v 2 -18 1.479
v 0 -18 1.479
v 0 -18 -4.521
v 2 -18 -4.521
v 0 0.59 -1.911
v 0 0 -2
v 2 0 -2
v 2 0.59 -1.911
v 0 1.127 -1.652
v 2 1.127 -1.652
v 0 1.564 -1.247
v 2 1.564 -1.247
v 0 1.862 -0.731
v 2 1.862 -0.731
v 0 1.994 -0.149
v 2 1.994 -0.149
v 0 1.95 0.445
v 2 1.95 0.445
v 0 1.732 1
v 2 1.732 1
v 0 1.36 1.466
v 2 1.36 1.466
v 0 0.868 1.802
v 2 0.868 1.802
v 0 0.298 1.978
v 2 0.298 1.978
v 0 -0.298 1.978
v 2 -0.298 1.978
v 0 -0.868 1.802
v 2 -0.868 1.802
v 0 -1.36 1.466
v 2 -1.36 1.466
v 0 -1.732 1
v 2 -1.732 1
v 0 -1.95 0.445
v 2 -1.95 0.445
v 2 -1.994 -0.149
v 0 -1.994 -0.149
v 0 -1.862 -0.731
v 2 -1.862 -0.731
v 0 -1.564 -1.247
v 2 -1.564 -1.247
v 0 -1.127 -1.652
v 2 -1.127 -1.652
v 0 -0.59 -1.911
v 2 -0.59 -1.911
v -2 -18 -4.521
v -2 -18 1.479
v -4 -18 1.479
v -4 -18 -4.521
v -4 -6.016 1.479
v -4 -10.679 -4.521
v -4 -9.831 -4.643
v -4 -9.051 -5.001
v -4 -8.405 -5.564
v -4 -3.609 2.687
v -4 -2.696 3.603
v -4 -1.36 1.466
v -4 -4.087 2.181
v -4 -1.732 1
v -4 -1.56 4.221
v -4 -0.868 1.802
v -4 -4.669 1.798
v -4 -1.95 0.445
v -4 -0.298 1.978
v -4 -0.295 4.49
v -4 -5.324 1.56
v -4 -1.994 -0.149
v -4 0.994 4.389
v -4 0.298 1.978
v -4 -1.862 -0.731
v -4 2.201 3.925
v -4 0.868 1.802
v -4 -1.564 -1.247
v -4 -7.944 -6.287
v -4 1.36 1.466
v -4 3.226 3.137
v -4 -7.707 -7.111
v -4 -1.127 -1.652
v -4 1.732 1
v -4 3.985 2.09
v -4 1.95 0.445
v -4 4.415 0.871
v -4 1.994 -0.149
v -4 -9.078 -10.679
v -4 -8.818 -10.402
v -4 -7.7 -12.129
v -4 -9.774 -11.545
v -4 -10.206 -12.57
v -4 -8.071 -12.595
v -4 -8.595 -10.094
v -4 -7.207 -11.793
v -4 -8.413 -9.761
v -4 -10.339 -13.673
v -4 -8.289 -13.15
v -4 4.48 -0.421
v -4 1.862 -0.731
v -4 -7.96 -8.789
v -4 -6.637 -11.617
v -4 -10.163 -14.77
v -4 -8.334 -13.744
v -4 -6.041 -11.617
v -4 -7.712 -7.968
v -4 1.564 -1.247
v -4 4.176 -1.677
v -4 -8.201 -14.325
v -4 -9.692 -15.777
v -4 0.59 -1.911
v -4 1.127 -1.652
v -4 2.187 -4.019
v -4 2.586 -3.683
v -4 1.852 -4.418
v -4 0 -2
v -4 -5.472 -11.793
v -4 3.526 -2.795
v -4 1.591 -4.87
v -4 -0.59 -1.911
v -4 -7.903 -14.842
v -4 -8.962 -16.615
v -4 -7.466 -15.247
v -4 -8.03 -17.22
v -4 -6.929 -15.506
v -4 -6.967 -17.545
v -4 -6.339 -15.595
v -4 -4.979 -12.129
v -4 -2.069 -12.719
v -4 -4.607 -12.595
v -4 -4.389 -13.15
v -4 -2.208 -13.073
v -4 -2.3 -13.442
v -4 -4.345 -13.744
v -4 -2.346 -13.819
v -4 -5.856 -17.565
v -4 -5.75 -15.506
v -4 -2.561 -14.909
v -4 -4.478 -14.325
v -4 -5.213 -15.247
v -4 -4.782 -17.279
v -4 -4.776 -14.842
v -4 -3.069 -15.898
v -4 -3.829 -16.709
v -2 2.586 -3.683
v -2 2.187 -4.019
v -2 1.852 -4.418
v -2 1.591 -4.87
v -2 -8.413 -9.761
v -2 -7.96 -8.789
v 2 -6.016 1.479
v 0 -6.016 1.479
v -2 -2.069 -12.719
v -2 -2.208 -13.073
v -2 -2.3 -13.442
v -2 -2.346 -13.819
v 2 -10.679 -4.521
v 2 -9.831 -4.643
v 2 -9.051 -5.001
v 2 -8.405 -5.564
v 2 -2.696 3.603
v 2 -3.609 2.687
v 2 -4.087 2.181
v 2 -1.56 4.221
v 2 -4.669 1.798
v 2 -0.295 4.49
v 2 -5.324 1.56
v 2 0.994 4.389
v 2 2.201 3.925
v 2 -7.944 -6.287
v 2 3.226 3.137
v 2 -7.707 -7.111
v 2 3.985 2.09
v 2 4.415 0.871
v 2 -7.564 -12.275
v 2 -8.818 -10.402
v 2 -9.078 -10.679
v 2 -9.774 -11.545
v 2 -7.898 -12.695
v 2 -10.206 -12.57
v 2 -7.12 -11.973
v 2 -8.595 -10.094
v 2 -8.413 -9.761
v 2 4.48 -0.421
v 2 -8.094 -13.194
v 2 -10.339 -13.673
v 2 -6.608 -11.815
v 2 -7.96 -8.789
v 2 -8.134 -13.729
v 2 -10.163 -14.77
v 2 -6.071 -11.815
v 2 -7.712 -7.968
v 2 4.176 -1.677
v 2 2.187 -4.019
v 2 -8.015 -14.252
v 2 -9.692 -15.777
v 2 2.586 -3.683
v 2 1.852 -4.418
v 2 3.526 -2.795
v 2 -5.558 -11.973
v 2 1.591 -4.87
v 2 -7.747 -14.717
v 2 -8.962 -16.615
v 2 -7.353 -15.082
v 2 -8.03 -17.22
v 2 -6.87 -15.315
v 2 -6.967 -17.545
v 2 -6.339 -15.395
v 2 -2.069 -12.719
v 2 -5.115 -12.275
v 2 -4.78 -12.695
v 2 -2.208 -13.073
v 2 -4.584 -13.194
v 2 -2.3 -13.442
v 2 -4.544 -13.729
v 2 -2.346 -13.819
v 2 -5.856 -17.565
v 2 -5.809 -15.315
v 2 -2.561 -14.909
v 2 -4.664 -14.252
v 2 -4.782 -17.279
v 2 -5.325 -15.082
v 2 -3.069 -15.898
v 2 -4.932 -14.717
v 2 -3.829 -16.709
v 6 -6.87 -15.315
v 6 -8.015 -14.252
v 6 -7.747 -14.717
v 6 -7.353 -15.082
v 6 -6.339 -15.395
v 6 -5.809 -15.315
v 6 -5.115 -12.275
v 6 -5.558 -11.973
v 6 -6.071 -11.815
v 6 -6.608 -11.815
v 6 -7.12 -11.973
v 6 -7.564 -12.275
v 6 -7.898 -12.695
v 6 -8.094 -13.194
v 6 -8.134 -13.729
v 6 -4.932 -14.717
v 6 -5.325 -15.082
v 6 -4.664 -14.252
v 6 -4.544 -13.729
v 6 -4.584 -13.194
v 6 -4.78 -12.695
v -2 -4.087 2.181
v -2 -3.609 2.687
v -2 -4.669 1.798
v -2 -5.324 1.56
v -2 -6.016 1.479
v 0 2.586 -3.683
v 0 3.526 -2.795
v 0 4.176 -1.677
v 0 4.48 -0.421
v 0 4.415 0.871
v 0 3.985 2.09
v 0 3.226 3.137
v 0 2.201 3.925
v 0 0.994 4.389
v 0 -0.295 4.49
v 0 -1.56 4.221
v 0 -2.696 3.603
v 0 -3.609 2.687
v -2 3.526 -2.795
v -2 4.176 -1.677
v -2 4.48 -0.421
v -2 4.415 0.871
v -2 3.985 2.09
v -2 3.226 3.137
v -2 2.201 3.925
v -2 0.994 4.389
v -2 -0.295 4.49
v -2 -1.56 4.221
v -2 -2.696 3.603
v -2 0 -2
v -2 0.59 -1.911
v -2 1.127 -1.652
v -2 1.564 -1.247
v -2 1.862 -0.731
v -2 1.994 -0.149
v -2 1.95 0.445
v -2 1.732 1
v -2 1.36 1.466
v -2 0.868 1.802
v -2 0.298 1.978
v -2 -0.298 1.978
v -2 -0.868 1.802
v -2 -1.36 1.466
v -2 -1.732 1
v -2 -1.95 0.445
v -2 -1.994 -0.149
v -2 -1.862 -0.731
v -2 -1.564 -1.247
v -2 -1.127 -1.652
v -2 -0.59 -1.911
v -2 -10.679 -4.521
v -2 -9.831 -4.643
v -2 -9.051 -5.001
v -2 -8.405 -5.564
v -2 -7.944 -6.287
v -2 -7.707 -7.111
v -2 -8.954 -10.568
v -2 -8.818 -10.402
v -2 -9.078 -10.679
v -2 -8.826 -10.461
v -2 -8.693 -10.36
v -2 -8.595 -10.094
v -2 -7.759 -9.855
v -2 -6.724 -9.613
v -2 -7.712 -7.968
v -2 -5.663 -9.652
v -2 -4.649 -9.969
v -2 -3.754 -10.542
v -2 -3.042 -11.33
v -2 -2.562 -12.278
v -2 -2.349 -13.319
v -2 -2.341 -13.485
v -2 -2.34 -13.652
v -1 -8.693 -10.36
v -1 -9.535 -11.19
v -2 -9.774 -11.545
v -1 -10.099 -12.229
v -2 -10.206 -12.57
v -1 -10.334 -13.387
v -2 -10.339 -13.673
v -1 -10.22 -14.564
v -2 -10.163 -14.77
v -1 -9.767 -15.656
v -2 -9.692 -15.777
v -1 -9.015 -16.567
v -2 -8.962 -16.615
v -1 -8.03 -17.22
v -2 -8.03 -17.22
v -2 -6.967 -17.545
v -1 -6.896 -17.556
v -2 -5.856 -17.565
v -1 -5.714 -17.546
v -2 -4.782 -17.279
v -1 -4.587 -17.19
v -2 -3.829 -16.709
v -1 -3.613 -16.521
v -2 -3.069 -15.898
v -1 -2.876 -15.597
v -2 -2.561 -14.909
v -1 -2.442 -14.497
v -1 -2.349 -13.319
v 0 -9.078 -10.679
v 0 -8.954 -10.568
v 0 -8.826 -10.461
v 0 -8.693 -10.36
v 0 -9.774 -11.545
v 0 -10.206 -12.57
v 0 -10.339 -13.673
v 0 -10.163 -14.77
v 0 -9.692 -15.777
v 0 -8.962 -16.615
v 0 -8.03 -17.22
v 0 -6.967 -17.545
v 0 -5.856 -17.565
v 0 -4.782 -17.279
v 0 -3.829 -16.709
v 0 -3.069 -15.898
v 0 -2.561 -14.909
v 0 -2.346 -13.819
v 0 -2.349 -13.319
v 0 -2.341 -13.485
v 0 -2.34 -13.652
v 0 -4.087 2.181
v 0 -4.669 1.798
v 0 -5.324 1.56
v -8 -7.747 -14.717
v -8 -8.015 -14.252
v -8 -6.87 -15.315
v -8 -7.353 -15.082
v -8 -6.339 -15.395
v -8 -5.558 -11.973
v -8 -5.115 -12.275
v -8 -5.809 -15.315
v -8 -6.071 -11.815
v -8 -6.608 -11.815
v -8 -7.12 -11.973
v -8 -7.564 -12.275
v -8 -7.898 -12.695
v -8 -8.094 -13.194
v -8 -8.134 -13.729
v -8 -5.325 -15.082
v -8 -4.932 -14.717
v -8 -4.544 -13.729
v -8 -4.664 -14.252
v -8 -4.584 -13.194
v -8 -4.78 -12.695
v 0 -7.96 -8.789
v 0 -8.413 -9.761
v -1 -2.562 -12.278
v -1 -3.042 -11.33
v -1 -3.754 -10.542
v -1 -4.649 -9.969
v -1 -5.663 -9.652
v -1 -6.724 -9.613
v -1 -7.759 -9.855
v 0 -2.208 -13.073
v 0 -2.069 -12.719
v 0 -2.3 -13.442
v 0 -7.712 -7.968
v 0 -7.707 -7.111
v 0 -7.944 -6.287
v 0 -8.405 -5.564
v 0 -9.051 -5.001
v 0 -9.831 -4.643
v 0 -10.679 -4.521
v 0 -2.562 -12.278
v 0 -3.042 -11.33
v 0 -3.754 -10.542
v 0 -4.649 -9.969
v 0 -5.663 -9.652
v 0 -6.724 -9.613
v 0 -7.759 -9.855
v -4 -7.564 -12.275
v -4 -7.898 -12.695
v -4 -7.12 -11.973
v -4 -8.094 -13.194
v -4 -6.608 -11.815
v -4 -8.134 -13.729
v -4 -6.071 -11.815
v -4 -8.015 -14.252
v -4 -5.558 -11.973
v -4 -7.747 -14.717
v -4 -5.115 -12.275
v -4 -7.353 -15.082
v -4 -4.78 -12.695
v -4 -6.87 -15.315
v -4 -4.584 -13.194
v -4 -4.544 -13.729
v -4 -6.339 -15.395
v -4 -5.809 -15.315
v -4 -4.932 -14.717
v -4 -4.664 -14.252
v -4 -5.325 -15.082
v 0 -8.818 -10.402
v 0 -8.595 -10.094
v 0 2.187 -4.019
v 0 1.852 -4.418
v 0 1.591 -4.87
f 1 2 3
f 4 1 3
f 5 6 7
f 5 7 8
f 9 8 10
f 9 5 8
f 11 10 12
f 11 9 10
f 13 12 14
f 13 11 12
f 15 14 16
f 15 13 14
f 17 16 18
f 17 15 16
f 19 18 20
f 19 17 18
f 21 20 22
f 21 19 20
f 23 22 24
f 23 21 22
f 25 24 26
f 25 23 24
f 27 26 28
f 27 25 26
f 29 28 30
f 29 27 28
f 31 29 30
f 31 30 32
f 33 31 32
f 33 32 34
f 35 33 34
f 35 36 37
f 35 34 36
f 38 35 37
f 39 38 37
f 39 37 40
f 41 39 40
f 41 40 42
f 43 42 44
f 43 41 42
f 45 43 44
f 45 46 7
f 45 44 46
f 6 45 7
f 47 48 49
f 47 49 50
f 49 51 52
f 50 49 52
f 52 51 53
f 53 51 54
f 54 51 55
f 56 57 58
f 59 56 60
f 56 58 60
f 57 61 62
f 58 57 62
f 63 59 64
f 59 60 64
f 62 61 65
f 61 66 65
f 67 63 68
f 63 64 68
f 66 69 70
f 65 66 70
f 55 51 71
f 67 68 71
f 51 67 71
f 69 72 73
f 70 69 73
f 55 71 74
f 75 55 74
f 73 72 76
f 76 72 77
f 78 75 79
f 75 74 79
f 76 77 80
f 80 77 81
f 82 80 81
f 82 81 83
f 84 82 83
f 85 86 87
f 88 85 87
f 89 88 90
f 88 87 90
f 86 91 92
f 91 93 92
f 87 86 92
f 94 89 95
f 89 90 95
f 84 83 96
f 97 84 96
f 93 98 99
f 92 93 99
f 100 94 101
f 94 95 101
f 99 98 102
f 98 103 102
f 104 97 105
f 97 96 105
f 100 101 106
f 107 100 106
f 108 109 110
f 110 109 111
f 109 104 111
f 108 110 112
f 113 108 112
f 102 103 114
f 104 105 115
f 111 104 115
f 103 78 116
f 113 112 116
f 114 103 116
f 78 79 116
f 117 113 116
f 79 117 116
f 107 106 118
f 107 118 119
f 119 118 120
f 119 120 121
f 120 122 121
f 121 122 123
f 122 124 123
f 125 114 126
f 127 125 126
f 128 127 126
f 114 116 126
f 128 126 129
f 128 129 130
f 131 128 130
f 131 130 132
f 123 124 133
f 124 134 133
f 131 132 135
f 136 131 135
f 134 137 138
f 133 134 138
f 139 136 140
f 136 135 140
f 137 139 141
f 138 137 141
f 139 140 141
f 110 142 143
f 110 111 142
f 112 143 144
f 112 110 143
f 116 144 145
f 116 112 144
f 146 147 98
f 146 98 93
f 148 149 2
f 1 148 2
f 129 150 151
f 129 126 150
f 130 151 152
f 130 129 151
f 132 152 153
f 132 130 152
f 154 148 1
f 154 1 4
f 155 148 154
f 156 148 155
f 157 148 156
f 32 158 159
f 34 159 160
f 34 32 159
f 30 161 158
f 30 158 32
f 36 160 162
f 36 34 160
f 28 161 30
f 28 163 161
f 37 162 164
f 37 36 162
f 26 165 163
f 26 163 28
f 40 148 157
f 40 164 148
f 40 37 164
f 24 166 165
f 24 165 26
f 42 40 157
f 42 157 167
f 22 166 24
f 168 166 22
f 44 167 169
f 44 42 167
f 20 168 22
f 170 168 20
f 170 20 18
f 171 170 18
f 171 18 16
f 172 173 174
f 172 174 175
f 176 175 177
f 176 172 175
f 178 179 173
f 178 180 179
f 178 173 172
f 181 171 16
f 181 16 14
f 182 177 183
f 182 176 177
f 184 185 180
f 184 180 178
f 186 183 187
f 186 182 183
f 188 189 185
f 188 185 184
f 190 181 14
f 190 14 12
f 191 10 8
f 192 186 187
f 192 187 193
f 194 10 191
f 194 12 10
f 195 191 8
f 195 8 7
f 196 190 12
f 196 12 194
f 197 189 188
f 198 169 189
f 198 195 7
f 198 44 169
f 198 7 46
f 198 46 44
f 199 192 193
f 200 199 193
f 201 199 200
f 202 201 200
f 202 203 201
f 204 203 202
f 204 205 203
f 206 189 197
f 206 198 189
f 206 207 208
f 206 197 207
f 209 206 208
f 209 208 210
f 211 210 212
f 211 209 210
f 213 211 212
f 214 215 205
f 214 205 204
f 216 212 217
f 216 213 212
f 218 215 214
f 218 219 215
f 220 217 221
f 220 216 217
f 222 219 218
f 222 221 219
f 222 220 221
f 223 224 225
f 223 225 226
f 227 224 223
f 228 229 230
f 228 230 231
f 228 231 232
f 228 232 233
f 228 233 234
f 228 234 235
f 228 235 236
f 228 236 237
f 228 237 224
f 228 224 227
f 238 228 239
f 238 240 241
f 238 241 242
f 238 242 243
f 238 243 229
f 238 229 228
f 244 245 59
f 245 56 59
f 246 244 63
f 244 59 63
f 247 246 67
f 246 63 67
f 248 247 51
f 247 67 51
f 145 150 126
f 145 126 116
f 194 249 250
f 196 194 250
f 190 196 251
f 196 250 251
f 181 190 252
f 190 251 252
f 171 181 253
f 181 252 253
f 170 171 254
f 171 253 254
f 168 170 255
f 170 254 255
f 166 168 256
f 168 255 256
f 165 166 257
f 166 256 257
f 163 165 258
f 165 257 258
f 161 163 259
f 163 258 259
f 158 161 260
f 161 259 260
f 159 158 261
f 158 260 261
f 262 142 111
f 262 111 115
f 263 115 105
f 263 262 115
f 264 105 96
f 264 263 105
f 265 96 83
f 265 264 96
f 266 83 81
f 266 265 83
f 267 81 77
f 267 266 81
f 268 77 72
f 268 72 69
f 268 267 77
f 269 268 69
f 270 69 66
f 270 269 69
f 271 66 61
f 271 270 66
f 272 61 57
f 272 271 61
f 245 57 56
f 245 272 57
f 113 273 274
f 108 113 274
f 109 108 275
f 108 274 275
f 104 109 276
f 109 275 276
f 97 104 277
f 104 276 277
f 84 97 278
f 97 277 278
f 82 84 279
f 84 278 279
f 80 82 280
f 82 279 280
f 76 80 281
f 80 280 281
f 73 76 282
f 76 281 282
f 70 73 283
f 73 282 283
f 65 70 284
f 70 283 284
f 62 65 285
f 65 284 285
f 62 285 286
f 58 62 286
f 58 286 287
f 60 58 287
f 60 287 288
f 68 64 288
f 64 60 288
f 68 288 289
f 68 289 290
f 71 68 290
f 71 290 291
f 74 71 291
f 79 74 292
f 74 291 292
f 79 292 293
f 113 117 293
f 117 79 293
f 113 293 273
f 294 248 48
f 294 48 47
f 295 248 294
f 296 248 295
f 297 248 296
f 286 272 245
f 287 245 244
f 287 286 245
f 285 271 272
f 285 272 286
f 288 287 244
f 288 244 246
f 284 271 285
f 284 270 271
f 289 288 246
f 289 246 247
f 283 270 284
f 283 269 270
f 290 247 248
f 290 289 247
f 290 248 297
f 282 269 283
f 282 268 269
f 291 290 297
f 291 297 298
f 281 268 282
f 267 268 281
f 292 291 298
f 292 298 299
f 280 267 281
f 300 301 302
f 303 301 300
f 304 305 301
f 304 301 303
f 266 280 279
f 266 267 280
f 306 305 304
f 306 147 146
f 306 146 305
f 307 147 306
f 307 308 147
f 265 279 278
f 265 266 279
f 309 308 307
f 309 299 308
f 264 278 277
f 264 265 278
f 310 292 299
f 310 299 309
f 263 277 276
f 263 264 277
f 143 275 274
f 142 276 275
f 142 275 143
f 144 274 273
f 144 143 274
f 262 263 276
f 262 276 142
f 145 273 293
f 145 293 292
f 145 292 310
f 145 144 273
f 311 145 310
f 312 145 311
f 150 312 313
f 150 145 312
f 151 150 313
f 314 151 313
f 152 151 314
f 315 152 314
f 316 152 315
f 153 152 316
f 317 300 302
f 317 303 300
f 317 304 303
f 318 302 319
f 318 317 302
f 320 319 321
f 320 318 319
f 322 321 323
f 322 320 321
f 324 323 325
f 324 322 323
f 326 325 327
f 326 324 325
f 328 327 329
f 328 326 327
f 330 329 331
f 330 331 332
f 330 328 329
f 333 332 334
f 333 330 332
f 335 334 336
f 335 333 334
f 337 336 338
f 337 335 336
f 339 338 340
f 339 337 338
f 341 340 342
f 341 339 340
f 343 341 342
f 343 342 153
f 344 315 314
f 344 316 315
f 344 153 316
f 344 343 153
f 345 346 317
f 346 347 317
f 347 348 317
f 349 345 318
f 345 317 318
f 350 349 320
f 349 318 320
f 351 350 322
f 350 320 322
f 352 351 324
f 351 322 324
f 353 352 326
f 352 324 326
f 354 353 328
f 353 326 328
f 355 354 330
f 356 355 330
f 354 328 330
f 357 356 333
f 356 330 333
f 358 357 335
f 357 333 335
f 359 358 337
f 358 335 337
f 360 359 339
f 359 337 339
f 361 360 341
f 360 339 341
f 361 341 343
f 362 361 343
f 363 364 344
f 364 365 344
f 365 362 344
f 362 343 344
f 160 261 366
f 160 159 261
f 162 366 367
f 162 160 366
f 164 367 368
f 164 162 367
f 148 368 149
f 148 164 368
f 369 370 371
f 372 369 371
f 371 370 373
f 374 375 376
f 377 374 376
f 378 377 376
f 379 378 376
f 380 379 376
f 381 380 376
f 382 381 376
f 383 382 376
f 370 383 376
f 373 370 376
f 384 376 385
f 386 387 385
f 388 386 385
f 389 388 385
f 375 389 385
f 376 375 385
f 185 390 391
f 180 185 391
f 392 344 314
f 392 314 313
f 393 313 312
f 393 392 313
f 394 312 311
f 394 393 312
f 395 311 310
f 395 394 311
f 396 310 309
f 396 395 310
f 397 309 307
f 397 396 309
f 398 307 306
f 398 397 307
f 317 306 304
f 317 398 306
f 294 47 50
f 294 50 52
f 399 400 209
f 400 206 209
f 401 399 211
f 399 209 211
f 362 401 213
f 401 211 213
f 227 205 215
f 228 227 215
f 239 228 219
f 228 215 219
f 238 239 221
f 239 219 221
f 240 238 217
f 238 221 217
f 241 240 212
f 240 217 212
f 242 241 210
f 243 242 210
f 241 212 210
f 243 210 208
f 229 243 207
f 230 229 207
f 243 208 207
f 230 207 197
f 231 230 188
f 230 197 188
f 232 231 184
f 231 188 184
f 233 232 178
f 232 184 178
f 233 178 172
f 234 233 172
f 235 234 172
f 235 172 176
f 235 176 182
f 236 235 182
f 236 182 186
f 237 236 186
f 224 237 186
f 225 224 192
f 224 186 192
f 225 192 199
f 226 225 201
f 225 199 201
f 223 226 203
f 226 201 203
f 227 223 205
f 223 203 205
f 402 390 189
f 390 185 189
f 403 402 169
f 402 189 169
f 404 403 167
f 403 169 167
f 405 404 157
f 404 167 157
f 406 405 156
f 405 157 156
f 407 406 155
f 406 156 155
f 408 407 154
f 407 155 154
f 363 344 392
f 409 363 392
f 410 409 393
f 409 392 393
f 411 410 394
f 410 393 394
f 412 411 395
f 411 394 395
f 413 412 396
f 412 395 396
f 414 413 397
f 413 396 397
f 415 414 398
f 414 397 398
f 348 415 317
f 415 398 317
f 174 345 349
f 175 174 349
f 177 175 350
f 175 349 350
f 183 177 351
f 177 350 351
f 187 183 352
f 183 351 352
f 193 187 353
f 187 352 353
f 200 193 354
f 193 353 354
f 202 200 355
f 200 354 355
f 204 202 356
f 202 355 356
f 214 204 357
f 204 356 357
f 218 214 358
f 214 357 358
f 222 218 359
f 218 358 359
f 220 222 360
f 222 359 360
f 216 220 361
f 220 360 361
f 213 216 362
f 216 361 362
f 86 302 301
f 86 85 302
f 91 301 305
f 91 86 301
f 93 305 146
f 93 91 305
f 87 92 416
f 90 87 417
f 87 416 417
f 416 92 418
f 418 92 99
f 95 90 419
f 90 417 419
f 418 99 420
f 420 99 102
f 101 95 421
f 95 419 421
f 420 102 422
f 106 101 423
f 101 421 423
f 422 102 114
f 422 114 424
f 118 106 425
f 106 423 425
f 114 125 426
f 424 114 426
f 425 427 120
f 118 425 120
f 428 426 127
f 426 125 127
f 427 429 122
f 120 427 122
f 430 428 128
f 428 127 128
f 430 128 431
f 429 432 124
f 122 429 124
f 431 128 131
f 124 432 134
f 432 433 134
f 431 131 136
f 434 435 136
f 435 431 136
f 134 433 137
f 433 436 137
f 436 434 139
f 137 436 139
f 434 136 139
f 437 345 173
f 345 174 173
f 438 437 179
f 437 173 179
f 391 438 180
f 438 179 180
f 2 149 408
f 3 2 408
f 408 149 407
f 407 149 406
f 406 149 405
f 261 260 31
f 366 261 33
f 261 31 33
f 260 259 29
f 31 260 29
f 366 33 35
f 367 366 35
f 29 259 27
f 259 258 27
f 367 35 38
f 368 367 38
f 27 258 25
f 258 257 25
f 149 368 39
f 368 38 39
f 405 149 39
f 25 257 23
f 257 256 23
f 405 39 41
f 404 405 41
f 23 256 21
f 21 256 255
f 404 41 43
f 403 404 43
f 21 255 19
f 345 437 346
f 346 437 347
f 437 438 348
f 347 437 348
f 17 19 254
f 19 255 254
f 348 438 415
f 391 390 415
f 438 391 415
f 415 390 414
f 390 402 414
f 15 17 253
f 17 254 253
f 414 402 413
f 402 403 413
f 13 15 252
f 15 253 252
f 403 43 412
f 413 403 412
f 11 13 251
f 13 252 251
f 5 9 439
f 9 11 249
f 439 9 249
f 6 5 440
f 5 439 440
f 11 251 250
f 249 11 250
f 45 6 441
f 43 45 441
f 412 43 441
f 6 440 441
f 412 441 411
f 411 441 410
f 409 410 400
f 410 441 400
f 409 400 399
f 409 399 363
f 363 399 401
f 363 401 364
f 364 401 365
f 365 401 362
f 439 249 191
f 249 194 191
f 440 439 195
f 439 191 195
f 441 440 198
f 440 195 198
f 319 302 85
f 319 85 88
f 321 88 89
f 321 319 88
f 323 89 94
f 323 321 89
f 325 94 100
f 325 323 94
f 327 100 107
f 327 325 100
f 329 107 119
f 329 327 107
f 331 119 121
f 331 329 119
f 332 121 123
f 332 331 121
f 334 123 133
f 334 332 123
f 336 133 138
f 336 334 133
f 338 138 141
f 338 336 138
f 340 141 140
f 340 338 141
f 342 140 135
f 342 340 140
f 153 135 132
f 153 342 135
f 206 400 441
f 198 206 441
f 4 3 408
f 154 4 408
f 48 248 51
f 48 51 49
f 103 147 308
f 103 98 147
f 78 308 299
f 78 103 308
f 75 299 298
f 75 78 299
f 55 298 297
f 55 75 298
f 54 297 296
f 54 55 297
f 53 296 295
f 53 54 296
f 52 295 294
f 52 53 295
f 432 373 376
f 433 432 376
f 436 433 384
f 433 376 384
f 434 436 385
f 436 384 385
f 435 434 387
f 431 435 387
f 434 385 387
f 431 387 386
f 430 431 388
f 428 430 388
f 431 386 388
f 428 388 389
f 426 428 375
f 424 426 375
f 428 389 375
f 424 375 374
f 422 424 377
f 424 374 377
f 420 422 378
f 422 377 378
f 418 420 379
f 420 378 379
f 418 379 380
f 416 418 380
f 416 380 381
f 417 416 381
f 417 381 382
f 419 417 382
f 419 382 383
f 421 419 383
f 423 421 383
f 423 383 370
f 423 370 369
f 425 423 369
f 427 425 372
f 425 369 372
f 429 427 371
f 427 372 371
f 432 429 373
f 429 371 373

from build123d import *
from build123d.topology import SkipClean

# Parameters (mm, degrees)
EXTRUDE_1_DEPTH          = 2
CUT_EXTRUDE_3_DEPTH      = 26.250159217995726
CUT_EXTRUDE_3_DEPTH_BACK = 26.250159217995726
SKETCH_1_3_R             = 2
SKETCH_1_3_R_2           = 1.9999999999999996
FILLET_1_R               = 3
EXTRUDE_START            = -1
EXTRUDE_2_DEPTH          = 1
SKETCH_2_R               = 1.9999999999999996
EXTRUDE_3_DEPTH          = 6
SKETCH_2_3_R             = 1.7999999999999992
EXTRUDE_4_DEPTH          = 4
EXTRUDE_START_2          = -10
SKETCH_2_4_R             = 1.7999999999999992
EXTRUDE_5_DEPTH          = 4


with BuildPart() as part:
    # 草图1 → 凸台-拉伸1 (new body)
    with BuildSketch(Plane(origin=(0, 0, 0), x_dir=(0, 0, -1), z_dir=(1, 0, 0))):
        with BuildLine():
            Line((1.4791639160924377, 3.172077254628277), (-1.4791639160924381, -3.172077254628276))
            Line((-1.4791639160924381, -3.172077254628276), (3.1918530496674338, -3.172077254628276))
            ThreePointArc((3.1918530496673796, -3.172077254628116), (4.160128527071201, -1.7156137788699422), (4.5, -1.1e-15))
            ThreePointArc((4.5, 0), (4.384156275694355, 1.0144820108261179), (4.042589444315643, 1.9767322997077126))
            Line((4.042589444315688, 1.9767322997077619), (1.4791639160924377, 3.172077254628277))
        make_face()
        with BuildLine():
            Line((1.0842616121308644, -4.367422209548816), (-1.4791639160924381, -3.172077254628276))
            Line((-1.4791639160924381, -3.172077254628276), (-1.479163916092438, -4.249949894919907))
            ThreePointArc((-1.4791639160925047, -4.249949894919926), (-0.20600216890754225, -4.495282316652135), (1.0842616121308772, -4.367422209548712))
        make_face()
        with BuildLine():
            Line((3.1918530496674338, -3.172077254628276), (-1.4791639160924381, -3.172077254628276))
            Line((-1.4791639160924381, -3.172077254628276), (1.0842616121308644, -4.367422209548816))
            ThreePointArc((1.0842616121308772, -4.367422209548712), (2.220022869369828, -3.914268572731687), (3.1918530496673796, -3.172077254628116))
        make_face()
        with BuildLine():
            Line((-1.479163916092438, -4.249949894919907), (-1.4791639160924381, -3.172077254628276))
            Line((-1.4791639160924381, -3.172077254628276), (1.4791639160924377, 3.172077254628277))
            Line((1.4791639160924377, 3.172077254628277), (4.042589444315688, 1.9767322997077619))
            ThreePointArc((4.042589444315643, 1.9767322997077126), (-3.3668502191083185, 2.9856857842194757), (-1.4791639160925047, -4.249949894919926))
        make_face()
        with BuildLine():
            ThreePointArc((4.5, -1.1e-15), (4.160128527071201, -1.7156137788699422), (3.1918530496673796, -3.172077254628116))
            Line((3.1918530496674338, -3.172077254628276), (4.520836083907562, -3.172077254628276))
            Line((4.520836083907562, -3.172077254628276), (4.520836083907562, -5.969923203558247))
            Line((4.520836083907563, -5.969923203558248), (10.360395406591675, -8.692954435976247))
            ThreePointArc((10.360395406591717, -8.69295443597619), (9.969385657403148, -4.6488008791476965), (13.318723238776467, -2.3487999267197663))
            Line((13.318723238776487, -2.348799926719662), (4.042589444315688, 1.9767322997077619))
            ThreePointArc((4.042589444315643, 1.9767322997077126), (4.384156275694355, 1.0144820108261179), (4.5, 0))
        make_face()
        with BuildLine():
            Line((4.520836083907562, -3.172077254628276), (3.1918530496674338, -3.172077254628276))
            ThreePointArc((3.1918530496673796, -3.172077254628116), (2.220022869369828, -3.914268572731687), (1.0842616121308772, -4.367422209548712))
            Line((1.0842616121308644, -4.367422209548816), (4.520836083907563, -5.969923203558248))
            Line((4.520836083907562, -5.969923203558247), (4.520836083907562, -3.172077254628276))
        make_face()
        with BuildLine():
            ThreePointArc((1.0842616121308772, -4.367422209548712), (-0.20600216890754225, -4.495282316652135), (-1.4791639160925047, -4.249949894919926))
            Line((-1.479163916092438, -4.249949894919907), (-1.4791639160924364, -18))
            Line((-1.4791639160924364, -18), (4.520836083907564, -18.000000000000004))
            Line((4.520836083907564, -18.000000000000004), (4.520836083907562, -5.969923203558247))
            Line((4.520836083907563, -5.969923203558248), (1.0842616121308644, -4.367422209548816))
        make_face()
        with BuildLine():
            ThreePointArc((17.59461680554977, -6.3392739261104545), (16.323758221169964, -3.4149300452464746), (13.318723238776467, -2.3487999267197663))
            Line((13.318723238776487, -2.348799926719663), (15.073780721642205, -3.1671966714821758))
            Line((15.073780721642205, -3.167196671482176), (12.115452889457329, -9.51135118073873))
            Line((12.115452889457327, -9.51135118073873), (10.360395406591675, -8.692954435976247))
            ThreePointArc((10.360395406591717, -8.69295443597619), (14.832177794787833, -10.143014558424401), (17.59461680554977, -6.339273926110455))
        make_face()
        with BuildLine():
            Line((15.073780721642205, -3.1671966714821758), (13.318723238776487, -2.348799926719663))
            ThreePointArc((13.318723238776467, -2.3487999267197663), (9.969385657403148, -4.6488008791476965), (10.360395406591717, -8.69295443597619))
            Line((10.360395406591675, -8.692954435976247), (12.115452889457327, -9.51135118073873))
            Line((12.115452889457329, -9.51135118073873), (15.073780721642205, -3.167196671482176))
        make_face()
    extrude(amount=EXTRUDE_1_DEPTH)

    # 草图1<3> → 切除-拉伸3 (cut, two sides: drawn at the far end of the back side and taken through both)
    with BuildSketch(Plane(origin=(0, 0, 0), x_dir=(0, 0, -1), z_dir=(1, 0, 0)).offset(-CUT_EXTRUDE_3_DEPTH_BACK)):
        Circle(SKETCH_1_3_R)
        with Locations((13.594616805549768, -6.3392739261104545)):
            Circle(SKETCH_1_3_R_2)
    extrude(amount=CUT_EXTRUDE_3_DEPTH + CUT_EXTRUDE_3_DEPTH_BACK, mode=Mode.SUBTRACT)

    # 圆角1
    fillet_1_edges = [part.edges().sort_by_distance(p)[0] for p in [
        (1, -2.3487999267197144, -13.318723238776478),
        (1, 1.9767322997077375, -4.0425894443156665),
        (1, -8.692954435976219, -10.360395406591696),
        (1, -5.969923203558247, -4.520836083907563),
        (1, -4.249949894919917, 1.4791639160924714),
    ]]
    fillet(fillet_1_edges, radius=FILLET_1_R)

    # 草图1<4> → 凸台-拉伸2 (add)
    with SkipClean():  # the faces are left unmerged after this step: merging them gives an invalid solid
        with BuildSketch(Plane(origin=(0, 0, 0), x_dir=(0, 0, -1), z_dir=(1, 0, 0)).offset(EXTRUDE_START)):
            with BuildLine():
                ThreePointArc((17.59461680554977, -6.3392739261104545), (16.323758221169964, -3.4149300452464746), (13.318723238776467, -2.3487999267197663))
                Line((13.318723238776487, -2.348799926719663), (15.073780721642205, -3.1671966714821758))
                Line((15.073780721642205, -3.167196671482176), (14.43985332903116, -4.526658352037151))
                ThreePointArc((14.439853329031175, -4.526658352037159), (15.28139969717554, -5.264674709416811), (15.594616805549768, -6.3392739261104545))
                ThreePointArc((15.594616805549768, -6.339273926110455), (14.66921602224341, -8.02605681773623), (12.749380282068358, -8.15188950018375))
                Line((12.749380282068373, -8.151889500183756), (12.115452889457329, -9.51135118073873))
                Line((12.115452889457327, -9.51135118073873), (10.360395406591675, -8.692954435976247))
                ThreePointArc((10.360395406591717, -8.69295443597619), (14.832177794787833, -10.143014558424401), (17.59461680554977, -6.339273926110455))
            make_face()
            with BuildLine():
                Line((15.073780721642205, -3.1671966714821758), (13.318723238776487, -2.348799926719663))
                ThreePointArc((13.318723238776467, -2.3487999267197663), (9.969385657403148, -4.6488008791476965), (10.360395406591717, -8.69295443597619))
                Line((10.360395406591675, -8.692954435976247), (12.115452889457327, -9.51135118073873))
                Line((12.115452889457329, -9.51135118073873), (12.749380282068373, -8.151889500183756))
                ThreePointArc((12.749380282068358, -8.15188950018375), (11.782001231476473, -5.494037402629046), (14.439853329031175, -4.526658352037159))
                Line((14.43985332903116, -4.526658352037151), (15.073780721642205, -3.167196671482176))
            make_face()
        extrude(amount=EXTRUDE_2_DEPTH)

    # 镜向1: part across plane


with BuildPart() as part_1:
    with SkipClean():  # the faces are left unmerged after this step: merging them gives an invalid solid
        add(part.part)
        add(part.part.mirror(Plane.ZY.offset(1)))

    # 草图2 → 凸台-拉伸3 (add)
    with BuildSketch(Plane(origin=(2, 0, 0), x_dir=(0, 0, -1), z_dir=(1, 0, 0))):
        with Locations((13.594616805549768, -6.3392739261104545)):
            Circle(SKETCH_2_R)
    extrude(amount=-EXTRUDE_3_DEPTH)

    # 草图2<3> → 凸台-拉伸4 (add)
    with BuildSketch(Plane(origin=(2, 0, 0), x_dir=(0, 0, -1), z_dir=(1, 0, 0))):
        with Locations((13.594616805549768, -6.3392739261104545)):
            Circle(SKETCH_2_3_R)
    extrude(amount=EXTRUDE_4_DEPTH)

    # 草图2<4> → 凸台-拉伸5 (add)
    with BuildSketch(Plane(origin=(2, 0, 0), x_dir=(0, 0, -1), z_dir=(1, 0, 0)).offset(EXTRUDE_START_2)):
        with Locations((13.594616805549768, -6.3392739261104545)):
            Circle(SKETCH_2_4_R)
    extrude(amount=EXTRUDE_5_DEPTH)


solid = part_1.part
